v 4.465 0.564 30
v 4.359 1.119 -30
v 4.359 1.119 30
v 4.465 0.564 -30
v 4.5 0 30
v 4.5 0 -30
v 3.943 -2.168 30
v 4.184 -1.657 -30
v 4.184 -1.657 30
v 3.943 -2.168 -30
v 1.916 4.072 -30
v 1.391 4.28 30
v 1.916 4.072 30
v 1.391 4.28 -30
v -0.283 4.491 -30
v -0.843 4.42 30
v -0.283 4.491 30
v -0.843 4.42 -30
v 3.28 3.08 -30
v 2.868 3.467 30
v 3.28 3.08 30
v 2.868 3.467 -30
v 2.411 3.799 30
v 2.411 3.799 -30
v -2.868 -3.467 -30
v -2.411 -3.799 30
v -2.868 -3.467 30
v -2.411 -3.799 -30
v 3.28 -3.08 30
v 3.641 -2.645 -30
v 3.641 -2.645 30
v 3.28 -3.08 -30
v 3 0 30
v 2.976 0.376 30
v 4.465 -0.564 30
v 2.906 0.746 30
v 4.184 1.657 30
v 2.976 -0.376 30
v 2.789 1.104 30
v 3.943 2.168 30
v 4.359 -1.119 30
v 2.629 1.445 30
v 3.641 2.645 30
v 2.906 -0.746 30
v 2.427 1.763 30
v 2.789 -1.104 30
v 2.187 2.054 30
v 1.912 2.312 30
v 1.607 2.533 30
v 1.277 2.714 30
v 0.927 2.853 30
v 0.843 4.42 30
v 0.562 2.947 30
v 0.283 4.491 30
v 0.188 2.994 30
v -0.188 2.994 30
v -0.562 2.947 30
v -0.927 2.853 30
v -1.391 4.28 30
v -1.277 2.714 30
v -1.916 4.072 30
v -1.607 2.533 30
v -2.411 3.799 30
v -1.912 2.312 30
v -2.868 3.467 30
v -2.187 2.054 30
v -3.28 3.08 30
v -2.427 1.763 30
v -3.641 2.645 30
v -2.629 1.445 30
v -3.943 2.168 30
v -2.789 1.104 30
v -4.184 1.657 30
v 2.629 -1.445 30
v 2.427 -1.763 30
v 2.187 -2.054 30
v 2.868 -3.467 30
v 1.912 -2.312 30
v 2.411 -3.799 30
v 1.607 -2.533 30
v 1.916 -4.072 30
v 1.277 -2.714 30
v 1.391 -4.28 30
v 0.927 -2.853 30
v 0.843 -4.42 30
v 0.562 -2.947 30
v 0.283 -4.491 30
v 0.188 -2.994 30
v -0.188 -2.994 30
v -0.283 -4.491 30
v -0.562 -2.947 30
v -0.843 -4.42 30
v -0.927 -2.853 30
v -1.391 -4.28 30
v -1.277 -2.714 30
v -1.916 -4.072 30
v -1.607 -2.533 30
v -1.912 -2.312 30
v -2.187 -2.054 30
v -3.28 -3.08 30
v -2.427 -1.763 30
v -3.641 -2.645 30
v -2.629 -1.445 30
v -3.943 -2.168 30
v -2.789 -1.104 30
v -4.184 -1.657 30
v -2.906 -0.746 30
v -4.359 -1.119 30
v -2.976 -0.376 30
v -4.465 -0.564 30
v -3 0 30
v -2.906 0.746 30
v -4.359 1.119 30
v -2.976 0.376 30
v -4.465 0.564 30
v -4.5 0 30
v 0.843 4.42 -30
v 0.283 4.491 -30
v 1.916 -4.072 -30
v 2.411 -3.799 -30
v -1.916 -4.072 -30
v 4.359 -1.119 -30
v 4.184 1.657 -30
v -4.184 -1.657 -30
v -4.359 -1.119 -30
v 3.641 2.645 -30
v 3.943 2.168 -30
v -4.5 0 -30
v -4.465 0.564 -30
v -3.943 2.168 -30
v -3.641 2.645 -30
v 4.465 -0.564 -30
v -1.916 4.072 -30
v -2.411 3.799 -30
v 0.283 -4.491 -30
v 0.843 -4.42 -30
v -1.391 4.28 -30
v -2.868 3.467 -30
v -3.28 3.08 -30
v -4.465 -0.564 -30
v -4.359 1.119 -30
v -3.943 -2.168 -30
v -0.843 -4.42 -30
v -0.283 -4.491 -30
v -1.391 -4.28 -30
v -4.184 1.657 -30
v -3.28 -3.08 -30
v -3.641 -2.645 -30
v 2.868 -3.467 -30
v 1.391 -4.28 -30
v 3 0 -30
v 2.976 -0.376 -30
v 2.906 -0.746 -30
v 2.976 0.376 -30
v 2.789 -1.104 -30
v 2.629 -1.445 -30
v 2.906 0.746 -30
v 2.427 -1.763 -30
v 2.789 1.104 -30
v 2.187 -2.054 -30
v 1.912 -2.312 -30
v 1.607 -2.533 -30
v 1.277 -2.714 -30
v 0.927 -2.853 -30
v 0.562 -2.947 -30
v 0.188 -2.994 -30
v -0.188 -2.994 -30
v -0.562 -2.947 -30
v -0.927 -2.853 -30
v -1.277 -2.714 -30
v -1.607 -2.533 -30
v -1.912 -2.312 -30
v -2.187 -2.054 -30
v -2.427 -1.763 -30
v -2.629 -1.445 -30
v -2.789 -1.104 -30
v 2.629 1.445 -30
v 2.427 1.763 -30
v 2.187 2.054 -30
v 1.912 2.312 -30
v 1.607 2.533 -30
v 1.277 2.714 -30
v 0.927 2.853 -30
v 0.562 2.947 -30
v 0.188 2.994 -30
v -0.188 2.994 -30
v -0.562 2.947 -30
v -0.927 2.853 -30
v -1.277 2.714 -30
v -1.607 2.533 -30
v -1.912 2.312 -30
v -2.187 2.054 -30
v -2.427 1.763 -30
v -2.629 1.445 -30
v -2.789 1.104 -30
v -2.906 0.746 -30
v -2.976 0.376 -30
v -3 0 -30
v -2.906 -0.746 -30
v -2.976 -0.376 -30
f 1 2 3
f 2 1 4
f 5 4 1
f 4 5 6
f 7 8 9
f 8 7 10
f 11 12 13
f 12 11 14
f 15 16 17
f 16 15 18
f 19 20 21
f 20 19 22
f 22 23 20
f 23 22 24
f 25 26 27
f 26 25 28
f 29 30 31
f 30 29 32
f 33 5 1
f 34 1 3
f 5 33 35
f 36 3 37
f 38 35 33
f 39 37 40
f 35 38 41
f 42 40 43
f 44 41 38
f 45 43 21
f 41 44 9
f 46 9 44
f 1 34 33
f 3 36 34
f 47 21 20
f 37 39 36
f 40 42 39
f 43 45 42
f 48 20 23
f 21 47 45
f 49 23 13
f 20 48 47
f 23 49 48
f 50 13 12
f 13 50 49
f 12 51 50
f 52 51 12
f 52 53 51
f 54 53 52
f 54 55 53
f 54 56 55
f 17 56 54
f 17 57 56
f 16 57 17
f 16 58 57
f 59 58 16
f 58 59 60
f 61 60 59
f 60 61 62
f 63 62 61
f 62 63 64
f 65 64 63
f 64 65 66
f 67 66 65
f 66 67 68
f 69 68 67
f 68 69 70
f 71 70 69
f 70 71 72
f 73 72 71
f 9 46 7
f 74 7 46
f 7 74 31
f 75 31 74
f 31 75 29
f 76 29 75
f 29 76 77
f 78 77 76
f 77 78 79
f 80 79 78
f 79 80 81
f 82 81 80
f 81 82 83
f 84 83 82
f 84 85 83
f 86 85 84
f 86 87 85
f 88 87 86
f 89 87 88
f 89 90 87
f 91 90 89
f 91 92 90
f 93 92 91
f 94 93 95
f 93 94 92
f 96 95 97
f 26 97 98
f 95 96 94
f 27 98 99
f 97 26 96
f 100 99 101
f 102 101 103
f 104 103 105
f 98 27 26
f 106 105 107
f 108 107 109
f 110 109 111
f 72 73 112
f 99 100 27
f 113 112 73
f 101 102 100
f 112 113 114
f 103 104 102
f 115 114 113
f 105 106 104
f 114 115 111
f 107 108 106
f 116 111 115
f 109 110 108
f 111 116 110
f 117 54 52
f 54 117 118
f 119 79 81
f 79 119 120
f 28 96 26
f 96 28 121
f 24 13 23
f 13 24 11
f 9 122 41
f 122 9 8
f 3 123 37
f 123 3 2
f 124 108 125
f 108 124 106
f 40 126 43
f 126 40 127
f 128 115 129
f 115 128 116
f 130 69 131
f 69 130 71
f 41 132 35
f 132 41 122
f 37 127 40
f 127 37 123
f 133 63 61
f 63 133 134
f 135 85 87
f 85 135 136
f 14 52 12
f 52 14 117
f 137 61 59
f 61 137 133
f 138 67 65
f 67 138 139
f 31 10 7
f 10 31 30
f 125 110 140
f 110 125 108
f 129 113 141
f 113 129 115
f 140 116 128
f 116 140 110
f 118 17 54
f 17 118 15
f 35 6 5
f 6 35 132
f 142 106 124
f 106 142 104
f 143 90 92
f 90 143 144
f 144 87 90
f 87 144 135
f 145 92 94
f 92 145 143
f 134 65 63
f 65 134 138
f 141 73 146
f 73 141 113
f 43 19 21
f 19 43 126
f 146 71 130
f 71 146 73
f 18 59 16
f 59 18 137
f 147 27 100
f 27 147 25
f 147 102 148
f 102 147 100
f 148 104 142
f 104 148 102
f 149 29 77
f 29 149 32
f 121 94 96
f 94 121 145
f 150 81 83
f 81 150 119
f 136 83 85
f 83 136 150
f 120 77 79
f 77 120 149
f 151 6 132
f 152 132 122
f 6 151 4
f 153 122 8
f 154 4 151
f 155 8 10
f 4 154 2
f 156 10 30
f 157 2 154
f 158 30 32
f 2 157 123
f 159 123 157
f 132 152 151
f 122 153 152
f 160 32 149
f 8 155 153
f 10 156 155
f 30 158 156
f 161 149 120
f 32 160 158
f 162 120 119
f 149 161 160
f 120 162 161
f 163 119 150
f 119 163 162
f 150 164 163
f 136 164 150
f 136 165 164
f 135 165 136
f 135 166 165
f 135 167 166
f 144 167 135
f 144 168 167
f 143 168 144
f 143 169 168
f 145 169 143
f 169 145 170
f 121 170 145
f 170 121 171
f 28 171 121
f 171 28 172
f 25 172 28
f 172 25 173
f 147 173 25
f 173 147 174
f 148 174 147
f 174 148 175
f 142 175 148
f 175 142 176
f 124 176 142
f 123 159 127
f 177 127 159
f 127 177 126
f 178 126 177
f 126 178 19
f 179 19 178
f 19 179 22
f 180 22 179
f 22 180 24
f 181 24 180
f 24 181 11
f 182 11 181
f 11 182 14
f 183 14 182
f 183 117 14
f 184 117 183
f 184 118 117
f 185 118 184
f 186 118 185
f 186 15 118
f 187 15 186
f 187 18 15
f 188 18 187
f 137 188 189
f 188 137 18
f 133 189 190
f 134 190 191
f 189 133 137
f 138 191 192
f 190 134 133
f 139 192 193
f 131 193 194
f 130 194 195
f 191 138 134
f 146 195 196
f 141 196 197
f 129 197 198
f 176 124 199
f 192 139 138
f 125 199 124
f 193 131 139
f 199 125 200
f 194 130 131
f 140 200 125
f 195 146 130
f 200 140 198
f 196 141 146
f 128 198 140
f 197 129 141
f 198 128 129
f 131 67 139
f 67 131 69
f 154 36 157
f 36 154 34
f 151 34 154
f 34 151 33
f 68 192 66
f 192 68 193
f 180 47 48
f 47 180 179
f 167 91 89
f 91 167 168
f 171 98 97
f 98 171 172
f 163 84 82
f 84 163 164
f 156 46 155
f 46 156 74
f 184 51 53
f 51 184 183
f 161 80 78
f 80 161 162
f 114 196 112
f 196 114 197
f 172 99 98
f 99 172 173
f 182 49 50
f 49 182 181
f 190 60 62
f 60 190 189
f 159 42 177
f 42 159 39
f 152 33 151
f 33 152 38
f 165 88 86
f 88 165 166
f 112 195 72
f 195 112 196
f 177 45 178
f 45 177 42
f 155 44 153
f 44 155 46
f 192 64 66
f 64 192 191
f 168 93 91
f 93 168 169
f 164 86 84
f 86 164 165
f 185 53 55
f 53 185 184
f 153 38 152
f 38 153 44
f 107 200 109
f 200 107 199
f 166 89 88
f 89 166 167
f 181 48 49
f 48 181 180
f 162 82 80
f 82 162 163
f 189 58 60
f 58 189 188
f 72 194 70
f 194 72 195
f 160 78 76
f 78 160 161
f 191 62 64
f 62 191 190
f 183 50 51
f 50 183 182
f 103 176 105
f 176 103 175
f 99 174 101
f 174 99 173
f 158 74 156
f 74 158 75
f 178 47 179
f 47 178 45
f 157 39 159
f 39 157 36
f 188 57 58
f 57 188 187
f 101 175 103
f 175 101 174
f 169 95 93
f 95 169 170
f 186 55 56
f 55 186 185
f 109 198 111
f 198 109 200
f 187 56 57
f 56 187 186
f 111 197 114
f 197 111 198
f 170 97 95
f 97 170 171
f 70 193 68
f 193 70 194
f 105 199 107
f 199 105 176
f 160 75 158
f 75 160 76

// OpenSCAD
$fn = 50;


difference() {
	union() {
		translate(v = [0, 0, -30.0000000000]) {
			cylinder(h = 60, r = 4.5000000000);
		}
	}
	union() {
		translate(v = [0, 0, -100.0000000000]) {
			cylinder(h = 200, r = 3.0000000000);
		}
	}
}
